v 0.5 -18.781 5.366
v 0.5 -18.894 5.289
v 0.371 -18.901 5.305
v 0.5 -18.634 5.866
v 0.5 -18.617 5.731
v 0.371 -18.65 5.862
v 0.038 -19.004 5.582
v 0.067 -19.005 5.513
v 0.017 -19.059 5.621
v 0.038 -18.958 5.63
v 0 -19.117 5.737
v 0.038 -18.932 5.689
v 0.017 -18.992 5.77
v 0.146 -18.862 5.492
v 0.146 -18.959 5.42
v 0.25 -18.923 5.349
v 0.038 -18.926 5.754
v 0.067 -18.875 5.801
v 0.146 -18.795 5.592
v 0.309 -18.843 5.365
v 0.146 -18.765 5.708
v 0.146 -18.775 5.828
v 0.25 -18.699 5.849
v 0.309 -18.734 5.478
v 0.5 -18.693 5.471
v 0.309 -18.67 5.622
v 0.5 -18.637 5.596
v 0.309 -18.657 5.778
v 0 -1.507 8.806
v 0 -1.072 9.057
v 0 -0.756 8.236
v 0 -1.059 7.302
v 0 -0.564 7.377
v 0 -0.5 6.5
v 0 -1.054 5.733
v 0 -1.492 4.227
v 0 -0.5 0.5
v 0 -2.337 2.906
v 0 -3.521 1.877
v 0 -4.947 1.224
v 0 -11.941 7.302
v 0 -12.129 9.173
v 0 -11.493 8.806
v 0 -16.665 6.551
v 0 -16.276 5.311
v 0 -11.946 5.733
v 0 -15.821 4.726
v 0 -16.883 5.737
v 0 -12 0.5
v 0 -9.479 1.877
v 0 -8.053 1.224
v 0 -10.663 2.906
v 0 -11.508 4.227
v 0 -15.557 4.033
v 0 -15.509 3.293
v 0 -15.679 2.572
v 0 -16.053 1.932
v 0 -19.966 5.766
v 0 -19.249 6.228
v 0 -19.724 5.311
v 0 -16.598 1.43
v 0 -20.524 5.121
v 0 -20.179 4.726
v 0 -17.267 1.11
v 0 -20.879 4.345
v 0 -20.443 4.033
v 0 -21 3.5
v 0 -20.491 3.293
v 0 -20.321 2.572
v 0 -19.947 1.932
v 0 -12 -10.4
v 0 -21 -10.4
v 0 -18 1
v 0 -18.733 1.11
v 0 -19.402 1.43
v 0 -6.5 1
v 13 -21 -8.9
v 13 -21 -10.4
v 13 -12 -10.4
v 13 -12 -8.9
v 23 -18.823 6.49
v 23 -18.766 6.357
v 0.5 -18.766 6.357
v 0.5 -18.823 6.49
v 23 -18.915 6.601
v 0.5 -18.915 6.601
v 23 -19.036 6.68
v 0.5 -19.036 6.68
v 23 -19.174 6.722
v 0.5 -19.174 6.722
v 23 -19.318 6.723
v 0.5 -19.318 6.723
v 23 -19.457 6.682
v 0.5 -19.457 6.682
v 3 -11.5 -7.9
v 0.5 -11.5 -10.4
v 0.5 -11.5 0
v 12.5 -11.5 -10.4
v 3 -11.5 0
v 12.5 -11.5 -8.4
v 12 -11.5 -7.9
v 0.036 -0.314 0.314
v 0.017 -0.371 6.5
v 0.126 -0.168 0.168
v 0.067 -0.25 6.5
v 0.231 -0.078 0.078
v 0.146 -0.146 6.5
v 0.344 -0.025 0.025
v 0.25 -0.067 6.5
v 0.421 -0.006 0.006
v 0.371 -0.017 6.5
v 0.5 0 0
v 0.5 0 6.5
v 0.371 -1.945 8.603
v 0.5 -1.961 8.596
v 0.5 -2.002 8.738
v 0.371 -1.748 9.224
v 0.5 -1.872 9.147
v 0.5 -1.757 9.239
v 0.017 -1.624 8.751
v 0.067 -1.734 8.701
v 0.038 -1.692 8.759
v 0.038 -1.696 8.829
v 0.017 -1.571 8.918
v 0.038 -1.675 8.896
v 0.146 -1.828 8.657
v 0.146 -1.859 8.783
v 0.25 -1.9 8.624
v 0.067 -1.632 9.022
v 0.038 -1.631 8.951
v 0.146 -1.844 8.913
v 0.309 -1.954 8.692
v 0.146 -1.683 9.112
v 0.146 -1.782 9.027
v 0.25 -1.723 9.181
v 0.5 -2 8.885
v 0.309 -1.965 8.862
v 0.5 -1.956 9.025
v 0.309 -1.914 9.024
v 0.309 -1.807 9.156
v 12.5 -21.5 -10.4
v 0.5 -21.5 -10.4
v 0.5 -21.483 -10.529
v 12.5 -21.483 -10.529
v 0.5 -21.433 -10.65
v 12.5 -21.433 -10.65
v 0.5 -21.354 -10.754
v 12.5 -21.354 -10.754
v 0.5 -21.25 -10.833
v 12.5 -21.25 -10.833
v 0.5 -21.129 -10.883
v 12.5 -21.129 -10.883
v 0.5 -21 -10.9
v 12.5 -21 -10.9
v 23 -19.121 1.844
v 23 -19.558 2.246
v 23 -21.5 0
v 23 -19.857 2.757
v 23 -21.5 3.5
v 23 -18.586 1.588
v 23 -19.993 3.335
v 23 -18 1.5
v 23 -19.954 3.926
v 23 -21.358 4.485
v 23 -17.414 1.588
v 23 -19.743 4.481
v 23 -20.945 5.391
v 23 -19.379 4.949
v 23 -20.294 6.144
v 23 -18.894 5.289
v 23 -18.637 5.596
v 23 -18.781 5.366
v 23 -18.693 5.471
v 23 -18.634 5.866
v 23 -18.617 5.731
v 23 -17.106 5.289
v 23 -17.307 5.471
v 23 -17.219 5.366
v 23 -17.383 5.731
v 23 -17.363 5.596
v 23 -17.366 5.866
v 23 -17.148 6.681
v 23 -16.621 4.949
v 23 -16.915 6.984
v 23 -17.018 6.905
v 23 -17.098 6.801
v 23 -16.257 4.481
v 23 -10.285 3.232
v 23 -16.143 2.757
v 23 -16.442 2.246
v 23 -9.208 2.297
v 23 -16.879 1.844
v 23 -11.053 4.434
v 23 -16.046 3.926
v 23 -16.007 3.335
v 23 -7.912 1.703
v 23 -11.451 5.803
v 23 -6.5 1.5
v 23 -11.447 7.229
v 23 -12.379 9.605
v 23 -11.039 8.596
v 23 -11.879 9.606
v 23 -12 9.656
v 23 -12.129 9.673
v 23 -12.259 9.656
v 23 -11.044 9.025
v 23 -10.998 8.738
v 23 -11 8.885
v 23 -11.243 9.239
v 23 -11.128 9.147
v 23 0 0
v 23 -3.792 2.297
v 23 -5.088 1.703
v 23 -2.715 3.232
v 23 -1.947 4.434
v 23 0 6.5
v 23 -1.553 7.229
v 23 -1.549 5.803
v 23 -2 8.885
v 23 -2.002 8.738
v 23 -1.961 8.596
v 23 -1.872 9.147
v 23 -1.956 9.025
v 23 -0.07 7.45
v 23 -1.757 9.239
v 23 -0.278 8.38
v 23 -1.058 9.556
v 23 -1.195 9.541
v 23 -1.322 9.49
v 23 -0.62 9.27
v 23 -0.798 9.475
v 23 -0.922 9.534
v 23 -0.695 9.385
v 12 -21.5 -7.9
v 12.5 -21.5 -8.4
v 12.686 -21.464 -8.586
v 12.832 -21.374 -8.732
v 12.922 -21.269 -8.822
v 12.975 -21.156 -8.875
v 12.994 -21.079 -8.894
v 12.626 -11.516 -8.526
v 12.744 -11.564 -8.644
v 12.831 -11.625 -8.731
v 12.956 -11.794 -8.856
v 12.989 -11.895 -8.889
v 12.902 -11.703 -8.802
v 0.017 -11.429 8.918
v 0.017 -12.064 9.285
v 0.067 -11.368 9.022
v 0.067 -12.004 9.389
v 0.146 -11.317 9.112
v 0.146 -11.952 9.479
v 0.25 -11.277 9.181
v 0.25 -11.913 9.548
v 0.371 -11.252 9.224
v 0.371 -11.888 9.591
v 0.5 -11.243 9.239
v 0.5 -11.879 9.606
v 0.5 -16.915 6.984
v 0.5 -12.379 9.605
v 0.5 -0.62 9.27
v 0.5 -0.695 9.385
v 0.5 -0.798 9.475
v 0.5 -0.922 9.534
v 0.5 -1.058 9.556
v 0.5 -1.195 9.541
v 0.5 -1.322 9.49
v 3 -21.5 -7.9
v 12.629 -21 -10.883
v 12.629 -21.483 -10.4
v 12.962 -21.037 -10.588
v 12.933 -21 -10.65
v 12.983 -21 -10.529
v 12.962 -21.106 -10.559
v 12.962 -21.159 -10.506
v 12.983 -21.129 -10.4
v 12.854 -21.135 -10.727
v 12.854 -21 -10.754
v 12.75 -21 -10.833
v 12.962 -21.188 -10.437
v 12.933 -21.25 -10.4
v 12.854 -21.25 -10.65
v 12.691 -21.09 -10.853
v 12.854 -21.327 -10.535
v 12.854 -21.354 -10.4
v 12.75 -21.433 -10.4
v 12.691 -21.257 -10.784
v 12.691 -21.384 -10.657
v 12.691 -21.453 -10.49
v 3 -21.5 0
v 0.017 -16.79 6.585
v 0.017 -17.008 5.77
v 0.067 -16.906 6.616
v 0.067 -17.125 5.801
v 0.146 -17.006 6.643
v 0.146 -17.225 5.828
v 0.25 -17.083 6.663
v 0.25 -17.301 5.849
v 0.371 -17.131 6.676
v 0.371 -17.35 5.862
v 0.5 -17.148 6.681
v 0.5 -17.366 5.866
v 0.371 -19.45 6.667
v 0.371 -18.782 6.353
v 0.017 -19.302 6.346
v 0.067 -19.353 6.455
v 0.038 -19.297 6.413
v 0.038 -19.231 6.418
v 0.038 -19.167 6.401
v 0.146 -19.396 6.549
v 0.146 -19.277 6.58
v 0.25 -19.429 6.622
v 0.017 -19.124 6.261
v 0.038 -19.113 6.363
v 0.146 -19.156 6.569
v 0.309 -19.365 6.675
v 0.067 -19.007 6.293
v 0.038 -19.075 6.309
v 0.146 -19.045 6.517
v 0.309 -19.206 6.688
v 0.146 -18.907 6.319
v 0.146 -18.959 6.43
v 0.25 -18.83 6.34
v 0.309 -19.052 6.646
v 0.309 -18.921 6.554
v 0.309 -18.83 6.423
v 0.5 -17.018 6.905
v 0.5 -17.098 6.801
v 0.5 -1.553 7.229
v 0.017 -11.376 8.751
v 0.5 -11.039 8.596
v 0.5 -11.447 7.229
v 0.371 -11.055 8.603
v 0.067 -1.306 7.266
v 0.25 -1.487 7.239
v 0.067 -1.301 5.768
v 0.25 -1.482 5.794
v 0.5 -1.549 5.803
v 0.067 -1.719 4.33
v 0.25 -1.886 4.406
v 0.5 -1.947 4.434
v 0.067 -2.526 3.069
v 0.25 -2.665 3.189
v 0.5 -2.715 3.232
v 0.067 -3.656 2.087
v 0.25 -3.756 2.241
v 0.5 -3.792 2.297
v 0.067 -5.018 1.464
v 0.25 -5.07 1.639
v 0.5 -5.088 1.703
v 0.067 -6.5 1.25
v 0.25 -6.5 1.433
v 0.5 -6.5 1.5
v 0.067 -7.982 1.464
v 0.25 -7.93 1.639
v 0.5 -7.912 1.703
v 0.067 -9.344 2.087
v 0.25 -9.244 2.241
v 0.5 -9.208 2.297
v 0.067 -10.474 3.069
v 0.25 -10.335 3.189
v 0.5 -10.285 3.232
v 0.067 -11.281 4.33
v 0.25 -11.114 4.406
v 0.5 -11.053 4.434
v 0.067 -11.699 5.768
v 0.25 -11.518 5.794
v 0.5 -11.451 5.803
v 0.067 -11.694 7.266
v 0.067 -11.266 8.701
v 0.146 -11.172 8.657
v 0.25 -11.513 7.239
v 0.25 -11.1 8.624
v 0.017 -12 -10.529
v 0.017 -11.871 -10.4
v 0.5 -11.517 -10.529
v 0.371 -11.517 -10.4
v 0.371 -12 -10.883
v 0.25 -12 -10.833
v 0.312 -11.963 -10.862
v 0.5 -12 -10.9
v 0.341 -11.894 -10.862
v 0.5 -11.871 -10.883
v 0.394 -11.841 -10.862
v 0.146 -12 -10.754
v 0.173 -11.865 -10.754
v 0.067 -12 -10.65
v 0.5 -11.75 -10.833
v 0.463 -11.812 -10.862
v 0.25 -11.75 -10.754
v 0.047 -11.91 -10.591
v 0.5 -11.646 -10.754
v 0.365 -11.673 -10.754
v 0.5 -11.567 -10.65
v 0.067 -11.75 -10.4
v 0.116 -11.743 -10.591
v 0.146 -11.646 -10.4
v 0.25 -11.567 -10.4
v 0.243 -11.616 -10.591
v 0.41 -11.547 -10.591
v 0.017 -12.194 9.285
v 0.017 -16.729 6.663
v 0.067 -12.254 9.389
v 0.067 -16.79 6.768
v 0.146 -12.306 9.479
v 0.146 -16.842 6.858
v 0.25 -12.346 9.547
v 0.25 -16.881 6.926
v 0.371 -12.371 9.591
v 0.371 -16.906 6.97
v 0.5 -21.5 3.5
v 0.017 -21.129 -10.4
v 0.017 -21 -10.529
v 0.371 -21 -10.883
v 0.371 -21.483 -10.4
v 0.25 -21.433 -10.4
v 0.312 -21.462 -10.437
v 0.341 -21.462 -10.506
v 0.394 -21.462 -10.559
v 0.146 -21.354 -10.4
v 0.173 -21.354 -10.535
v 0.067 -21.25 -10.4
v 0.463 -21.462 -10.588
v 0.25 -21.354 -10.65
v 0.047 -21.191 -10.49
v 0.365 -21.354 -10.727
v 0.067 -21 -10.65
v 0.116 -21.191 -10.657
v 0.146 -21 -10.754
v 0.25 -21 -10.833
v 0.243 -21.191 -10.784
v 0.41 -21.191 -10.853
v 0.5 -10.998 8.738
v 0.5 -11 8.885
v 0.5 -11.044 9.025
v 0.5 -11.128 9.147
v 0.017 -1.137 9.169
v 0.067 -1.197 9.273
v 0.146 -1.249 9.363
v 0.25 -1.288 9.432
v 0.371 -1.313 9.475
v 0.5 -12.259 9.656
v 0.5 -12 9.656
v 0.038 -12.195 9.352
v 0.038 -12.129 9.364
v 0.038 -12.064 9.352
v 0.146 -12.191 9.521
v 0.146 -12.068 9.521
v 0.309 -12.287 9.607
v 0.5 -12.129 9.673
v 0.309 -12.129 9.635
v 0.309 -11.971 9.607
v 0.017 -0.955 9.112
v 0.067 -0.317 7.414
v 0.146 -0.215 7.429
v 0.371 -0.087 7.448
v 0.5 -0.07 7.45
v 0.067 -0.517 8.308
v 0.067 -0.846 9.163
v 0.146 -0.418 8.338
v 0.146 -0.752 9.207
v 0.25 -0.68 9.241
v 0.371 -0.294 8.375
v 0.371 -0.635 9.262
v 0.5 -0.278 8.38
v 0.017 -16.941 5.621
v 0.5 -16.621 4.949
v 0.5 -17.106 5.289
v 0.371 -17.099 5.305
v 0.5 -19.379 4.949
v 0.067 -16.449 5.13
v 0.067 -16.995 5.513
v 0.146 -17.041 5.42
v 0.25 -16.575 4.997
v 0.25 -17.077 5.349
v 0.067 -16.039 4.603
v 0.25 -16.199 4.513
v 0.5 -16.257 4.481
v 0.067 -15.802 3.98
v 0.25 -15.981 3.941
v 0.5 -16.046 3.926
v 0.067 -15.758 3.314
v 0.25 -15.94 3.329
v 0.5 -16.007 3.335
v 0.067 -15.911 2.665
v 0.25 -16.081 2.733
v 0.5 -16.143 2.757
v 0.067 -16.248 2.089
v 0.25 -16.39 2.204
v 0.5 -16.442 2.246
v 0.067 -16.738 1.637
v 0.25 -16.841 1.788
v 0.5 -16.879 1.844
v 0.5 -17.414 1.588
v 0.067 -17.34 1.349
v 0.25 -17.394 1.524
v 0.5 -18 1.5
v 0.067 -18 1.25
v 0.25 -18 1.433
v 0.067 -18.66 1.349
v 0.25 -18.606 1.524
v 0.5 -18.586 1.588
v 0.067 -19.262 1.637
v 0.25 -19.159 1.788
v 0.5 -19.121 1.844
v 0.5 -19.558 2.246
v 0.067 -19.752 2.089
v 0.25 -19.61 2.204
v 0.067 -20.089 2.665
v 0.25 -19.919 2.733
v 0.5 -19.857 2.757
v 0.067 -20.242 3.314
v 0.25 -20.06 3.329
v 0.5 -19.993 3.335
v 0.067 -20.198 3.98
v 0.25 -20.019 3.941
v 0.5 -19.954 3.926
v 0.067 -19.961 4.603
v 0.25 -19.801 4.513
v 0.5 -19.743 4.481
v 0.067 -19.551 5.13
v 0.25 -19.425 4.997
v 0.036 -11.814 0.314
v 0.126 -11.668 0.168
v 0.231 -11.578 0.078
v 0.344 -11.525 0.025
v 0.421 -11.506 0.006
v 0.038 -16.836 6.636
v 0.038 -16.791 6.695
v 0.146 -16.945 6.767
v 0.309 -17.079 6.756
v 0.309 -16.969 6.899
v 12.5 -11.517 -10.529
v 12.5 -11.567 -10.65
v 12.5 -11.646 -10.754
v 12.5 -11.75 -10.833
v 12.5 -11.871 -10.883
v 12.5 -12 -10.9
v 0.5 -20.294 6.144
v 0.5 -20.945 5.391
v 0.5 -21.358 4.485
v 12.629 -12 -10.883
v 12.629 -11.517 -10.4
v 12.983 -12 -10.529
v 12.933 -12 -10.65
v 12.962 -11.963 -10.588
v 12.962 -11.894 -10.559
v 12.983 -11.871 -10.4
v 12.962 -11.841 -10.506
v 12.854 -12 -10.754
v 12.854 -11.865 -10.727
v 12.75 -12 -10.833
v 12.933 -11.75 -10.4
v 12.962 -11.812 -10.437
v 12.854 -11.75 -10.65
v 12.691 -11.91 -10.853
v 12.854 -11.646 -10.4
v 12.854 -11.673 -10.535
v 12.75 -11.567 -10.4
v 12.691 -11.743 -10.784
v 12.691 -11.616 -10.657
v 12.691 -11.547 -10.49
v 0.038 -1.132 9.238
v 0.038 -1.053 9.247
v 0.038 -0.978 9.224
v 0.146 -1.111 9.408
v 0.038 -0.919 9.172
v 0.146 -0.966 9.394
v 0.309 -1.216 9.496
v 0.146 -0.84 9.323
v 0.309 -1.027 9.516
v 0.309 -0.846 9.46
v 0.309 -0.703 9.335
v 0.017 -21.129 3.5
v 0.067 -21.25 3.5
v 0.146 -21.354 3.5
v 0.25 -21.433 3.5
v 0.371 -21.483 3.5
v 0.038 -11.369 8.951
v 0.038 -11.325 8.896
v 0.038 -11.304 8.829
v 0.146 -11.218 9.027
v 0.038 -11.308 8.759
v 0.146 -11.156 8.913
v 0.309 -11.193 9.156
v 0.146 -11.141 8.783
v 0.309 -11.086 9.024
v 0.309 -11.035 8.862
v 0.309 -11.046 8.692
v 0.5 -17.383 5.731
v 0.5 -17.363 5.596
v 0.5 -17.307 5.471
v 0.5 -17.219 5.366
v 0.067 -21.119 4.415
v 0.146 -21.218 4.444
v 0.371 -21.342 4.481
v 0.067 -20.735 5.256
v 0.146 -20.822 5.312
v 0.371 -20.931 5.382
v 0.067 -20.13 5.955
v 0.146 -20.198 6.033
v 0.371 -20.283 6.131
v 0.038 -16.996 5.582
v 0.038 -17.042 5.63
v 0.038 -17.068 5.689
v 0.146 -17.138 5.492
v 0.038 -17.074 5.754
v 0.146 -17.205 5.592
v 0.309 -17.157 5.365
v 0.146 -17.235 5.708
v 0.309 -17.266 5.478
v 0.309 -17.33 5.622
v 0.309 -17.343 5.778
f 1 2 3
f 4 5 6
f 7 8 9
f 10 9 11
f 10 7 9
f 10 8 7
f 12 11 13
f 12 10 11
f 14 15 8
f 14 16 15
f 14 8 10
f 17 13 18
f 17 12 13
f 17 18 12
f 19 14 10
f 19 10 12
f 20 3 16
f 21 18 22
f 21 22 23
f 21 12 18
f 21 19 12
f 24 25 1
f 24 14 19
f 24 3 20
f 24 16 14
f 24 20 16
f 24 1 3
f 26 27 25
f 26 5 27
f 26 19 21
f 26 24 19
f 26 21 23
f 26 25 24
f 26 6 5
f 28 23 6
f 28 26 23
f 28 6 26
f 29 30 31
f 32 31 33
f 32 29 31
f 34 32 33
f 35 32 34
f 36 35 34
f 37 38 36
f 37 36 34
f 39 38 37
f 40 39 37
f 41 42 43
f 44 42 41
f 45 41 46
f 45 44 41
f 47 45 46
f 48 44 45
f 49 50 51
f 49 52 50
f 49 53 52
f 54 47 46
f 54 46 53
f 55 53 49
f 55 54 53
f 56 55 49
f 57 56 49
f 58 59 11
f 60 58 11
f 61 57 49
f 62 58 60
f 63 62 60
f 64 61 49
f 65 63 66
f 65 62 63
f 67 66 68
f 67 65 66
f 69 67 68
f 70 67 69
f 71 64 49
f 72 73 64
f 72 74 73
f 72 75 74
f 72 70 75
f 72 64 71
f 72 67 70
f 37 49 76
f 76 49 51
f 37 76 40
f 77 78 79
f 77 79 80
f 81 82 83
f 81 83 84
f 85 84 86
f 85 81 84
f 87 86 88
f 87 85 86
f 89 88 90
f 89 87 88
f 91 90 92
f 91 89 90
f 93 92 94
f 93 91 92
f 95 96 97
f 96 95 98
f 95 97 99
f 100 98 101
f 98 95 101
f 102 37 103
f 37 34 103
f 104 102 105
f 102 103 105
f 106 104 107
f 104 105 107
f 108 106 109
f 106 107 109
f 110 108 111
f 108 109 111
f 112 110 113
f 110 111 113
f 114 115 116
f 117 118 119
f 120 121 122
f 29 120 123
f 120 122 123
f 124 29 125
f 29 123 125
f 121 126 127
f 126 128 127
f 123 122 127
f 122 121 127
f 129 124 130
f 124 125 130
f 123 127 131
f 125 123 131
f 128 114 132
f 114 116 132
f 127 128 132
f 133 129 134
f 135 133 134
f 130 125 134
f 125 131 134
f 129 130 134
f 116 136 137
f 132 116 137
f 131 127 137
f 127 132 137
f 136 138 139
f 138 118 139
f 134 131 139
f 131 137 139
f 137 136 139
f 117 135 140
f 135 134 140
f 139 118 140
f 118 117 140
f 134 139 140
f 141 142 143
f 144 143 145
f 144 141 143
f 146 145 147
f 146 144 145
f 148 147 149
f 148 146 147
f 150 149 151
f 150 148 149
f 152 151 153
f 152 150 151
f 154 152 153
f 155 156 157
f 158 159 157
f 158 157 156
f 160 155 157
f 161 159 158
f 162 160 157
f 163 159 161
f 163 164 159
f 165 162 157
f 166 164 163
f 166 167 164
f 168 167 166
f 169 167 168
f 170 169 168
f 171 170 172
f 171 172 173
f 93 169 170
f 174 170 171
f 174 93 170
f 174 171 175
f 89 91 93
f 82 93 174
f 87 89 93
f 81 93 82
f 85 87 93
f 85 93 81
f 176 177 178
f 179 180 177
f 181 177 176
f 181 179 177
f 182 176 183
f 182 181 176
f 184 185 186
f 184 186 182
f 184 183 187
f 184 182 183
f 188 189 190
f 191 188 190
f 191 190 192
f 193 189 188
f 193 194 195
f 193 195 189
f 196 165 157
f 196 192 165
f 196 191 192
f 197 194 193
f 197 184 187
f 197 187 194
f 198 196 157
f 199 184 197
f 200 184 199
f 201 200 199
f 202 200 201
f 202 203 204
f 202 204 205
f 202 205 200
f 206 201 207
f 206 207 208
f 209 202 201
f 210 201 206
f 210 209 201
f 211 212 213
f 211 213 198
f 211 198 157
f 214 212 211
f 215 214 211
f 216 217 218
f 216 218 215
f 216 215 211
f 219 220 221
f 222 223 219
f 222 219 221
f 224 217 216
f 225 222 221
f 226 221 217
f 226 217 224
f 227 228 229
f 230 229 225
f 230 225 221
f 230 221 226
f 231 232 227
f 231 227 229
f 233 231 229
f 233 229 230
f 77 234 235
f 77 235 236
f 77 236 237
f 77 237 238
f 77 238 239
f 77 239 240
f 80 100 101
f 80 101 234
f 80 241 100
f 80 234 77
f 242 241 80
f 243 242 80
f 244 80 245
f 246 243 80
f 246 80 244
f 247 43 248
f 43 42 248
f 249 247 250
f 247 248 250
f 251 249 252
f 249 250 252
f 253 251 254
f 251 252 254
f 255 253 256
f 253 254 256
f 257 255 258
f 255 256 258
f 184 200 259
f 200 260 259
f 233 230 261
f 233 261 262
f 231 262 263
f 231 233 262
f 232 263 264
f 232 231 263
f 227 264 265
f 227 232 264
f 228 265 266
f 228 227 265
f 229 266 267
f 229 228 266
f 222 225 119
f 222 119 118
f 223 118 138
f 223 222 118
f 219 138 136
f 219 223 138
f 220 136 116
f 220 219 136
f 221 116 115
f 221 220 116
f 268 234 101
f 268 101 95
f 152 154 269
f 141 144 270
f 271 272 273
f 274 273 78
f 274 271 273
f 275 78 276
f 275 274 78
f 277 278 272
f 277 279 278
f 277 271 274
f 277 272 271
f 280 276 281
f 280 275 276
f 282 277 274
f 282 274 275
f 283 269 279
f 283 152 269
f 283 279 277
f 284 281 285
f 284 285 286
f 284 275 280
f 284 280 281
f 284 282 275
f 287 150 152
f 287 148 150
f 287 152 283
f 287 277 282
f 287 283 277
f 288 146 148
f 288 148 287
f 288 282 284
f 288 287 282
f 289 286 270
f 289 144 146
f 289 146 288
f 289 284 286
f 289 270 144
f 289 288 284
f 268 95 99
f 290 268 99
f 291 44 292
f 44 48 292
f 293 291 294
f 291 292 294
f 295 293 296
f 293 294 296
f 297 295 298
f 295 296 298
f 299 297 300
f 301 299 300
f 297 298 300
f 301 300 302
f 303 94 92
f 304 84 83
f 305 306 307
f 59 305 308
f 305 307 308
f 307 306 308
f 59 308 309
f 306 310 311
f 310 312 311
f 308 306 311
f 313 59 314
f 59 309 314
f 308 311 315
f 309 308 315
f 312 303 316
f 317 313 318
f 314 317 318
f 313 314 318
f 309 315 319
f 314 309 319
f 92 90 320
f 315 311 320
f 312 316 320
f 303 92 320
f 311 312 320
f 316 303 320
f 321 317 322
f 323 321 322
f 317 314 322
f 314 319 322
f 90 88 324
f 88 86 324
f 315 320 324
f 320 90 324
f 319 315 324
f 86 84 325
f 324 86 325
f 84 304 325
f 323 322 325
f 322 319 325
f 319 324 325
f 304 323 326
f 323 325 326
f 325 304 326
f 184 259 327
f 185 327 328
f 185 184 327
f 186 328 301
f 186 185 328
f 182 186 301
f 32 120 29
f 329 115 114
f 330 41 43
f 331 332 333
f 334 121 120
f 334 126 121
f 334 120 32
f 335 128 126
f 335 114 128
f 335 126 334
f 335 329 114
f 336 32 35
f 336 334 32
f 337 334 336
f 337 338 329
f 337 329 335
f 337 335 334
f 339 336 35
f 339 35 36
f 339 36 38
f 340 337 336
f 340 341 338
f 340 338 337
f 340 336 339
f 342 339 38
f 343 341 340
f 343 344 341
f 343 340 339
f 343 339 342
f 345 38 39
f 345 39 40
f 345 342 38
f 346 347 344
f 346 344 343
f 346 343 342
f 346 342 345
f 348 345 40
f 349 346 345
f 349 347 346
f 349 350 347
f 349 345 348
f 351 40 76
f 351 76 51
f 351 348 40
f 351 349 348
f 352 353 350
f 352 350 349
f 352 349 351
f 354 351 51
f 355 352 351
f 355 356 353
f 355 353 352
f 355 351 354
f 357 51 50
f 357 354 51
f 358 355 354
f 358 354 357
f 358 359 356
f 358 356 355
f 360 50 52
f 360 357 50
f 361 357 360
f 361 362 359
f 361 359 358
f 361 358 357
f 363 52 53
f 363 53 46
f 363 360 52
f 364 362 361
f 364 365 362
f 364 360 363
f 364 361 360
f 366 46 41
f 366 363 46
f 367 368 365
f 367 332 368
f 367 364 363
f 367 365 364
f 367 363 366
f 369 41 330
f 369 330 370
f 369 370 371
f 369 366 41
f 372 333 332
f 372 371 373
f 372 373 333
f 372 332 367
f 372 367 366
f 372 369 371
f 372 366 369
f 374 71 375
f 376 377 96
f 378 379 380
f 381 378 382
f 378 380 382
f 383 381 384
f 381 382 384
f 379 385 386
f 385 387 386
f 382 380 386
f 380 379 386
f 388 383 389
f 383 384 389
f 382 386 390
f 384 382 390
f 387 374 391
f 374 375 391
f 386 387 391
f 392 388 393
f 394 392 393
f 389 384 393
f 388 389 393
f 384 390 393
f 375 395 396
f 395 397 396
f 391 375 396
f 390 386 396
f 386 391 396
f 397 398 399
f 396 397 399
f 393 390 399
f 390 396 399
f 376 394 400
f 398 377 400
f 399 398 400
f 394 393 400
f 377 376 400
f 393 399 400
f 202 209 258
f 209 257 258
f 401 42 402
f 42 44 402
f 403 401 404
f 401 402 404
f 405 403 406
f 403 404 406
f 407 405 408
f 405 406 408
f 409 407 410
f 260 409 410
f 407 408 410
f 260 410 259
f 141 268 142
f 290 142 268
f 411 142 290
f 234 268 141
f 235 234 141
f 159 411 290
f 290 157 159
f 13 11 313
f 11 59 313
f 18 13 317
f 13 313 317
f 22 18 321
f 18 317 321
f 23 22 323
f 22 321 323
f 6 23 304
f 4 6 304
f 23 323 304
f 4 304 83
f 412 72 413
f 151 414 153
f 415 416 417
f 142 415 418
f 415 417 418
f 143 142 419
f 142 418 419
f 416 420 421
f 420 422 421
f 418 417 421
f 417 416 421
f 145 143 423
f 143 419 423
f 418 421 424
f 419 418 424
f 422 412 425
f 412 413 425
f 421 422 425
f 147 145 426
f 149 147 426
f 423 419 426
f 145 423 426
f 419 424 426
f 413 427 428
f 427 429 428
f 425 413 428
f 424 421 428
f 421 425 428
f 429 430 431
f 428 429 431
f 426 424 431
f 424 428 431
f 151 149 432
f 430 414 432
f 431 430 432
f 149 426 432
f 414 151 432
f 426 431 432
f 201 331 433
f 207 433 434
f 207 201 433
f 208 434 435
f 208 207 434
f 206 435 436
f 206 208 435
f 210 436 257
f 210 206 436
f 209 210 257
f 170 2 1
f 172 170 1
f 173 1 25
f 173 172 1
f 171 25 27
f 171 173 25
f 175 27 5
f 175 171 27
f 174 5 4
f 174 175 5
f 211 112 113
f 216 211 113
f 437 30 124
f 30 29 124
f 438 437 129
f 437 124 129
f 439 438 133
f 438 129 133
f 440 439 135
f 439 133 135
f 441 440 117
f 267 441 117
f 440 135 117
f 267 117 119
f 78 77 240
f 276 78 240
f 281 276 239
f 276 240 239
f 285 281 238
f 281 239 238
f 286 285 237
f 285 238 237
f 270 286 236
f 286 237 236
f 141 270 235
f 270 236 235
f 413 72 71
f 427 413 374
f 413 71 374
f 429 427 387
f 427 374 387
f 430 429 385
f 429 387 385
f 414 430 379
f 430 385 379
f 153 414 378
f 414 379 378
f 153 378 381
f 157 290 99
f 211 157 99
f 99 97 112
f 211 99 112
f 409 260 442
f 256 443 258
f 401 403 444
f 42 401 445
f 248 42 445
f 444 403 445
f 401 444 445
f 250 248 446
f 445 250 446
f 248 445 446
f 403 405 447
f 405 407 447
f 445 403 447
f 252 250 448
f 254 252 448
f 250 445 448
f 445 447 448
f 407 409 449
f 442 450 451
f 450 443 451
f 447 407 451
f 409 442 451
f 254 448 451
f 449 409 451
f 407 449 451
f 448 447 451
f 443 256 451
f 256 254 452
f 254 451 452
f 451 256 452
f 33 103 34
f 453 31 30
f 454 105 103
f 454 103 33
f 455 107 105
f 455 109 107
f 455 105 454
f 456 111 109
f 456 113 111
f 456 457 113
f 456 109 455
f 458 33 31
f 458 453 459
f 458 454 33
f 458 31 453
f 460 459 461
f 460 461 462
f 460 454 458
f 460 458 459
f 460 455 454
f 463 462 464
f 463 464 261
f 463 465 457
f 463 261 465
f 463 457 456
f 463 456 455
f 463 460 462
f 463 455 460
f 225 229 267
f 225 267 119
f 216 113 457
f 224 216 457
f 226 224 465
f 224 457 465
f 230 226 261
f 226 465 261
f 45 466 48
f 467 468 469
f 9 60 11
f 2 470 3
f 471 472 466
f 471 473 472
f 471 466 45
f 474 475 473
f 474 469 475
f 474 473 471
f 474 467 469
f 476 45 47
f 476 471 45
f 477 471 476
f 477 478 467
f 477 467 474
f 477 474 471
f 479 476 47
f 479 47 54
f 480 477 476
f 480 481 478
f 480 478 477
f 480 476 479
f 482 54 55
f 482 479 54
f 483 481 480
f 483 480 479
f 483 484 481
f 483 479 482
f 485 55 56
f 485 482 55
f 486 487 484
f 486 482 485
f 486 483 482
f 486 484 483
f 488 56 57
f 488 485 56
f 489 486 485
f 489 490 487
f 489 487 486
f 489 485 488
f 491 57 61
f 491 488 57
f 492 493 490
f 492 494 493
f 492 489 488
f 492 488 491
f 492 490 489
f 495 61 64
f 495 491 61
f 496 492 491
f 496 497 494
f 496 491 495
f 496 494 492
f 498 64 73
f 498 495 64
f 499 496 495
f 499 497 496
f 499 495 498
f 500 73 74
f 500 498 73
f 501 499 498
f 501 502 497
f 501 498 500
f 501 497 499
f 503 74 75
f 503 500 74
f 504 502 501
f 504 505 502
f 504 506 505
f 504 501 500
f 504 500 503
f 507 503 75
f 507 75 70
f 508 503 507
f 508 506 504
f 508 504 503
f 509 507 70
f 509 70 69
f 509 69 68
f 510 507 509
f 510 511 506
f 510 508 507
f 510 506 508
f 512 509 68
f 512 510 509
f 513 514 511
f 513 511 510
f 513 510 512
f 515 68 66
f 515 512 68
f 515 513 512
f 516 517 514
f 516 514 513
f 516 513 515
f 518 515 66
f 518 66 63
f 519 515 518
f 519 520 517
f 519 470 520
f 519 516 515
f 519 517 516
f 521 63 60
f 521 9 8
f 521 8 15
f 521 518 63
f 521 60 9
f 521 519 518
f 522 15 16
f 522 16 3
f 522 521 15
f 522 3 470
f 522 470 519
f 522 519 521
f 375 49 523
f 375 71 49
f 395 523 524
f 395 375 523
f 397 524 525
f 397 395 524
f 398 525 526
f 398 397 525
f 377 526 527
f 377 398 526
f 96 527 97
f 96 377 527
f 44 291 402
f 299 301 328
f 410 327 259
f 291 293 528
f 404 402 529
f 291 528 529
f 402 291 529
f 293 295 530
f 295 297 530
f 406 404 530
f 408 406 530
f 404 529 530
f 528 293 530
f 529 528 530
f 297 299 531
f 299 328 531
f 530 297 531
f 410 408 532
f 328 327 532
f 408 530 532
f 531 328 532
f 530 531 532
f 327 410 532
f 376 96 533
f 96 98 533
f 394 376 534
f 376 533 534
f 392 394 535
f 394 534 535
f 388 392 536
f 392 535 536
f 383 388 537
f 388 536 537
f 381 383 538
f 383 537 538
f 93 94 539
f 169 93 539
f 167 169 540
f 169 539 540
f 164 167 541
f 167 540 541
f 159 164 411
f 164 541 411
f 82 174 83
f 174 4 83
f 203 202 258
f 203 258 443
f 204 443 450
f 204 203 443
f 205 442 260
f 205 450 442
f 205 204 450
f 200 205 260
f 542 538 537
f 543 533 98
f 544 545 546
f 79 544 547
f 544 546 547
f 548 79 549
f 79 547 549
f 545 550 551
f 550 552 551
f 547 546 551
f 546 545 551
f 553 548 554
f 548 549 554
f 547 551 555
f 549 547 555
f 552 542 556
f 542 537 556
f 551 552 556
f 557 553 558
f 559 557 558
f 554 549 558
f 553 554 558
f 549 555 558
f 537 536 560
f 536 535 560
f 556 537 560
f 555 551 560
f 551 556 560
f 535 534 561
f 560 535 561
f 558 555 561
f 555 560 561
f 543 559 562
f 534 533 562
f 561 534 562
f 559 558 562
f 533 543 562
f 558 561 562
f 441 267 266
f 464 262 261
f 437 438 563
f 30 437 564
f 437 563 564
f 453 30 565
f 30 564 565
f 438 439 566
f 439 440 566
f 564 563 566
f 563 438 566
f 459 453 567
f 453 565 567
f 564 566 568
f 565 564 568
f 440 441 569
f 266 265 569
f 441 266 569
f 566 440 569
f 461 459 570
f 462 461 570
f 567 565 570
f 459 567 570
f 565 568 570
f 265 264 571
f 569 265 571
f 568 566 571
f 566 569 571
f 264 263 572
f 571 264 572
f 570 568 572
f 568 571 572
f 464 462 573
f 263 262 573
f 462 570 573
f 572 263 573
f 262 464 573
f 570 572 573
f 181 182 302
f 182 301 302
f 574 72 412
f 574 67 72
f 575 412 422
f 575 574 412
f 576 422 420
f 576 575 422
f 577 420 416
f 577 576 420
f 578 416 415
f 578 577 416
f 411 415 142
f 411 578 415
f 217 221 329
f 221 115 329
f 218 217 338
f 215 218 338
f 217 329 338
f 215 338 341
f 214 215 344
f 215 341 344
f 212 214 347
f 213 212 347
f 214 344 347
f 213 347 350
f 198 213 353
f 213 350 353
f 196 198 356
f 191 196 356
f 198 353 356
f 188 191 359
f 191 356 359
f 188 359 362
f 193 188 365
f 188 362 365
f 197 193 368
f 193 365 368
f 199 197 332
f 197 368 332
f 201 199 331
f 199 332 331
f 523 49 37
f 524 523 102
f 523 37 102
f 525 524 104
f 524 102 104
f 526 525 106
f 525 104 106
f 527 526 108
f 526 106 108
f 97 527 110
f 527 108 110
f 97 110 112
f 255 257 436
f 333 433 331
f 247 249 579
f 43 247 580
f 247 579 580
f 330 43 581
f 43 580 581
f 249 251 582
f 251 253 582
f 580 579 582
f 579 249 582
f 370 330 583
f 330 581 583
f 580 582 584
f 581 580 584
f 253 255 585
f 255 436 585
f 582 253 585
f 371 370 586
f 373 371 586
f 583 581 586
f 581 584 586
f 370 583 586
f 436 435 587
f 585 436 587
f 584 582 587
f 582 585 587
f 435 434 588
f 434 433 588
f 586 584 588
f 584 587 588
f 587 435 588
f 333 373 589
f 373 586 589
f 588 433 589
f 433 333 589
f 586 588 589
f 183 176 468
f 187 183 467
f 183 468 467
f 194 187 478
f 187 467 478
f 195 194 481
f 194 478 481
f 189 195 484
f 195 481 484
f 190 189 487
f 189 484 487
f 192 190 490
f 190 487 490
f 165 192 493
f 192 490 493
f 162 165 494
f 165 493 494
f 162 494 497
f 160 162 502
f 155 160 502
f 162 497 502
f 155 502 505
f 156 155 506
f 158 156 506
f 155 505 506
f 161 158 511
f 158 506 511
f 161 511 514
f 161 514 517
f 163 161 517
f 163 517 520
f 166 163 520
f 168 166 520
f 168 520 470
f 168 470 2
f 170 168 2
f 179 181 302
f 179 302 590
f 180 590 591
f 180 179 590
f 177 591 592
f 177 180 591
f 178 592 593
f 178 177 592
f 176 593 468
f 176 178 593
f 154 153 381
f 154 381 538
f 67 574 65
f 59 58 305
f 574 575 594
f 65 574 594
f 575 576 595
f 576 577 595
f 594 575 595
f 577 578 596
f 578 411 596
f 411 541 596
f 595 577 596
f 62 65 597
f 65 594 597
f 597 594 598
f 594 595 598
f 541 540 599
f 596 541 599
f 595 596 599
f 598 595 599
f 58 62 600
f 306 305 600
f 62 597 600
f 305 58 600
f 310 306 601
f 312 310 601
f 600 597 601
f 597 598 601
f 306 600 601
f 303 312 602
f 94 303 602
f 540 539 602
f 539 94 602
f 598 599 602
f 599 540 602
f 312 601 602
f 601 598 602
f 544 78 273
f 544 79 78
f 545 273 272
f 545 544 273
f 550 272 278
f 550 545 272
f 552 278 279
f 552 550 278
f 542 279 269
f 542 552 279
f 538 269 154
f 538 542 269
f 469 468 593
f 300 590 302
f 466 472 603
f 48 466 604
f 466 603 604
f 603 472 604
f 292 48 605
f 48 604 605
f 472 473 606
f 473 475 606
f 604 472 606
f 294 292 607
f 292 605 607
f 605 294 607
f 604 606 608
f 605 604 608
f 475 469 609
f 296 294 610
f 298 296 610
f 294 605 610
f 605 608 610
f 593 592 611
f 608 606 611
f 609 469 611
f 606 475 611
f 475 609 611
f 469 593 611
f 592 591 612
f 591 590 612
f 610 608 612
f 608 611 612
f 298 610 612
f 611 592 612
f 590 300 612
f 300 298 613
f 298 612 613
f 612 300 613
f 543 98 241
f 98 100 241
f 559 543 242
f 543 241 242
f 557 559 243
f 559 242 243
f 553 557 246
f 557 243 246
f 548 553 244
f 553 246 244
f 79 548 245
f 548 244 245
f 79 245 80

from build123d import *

# Parameters (mm, degrees)
F1_DEPTH    = 23
F3_DEPTH    = 10
F4_R        = 0.5
F5_T1_DEPTH = 14.1433659759


# Not quite as in the source:
# - a fillet or chamfer that OpenCascade refuses, or shapes differently, is made with other operations: its cross-section is extruded or revolved along the edge and cut away or added


with BuildPart() as f1:
    # F0 (on Right) → F1 (new body)
    with BuildSketch(Plane.YZ):
        with BuildLine():
            Line((-21.5, 0), (0, 0))
            Line((0, 0), (0, 6.5))
            ThreePointArc((0, 6.5), (-0.2214821291, 8.1823237932), (-0.8708348754, 9.75))
            Line((-0.8708348754, 9.75), (-2.1698729811, 9))
            ThreePointArc((-2.1698729811, 9), (-6.5, 1.5), (-10.8301270189, 9))
            Line((-10.8301270189, 9), (-12.1291651246, 9.75))
            Line((-12.1291651246, 9.75), (-17.0941333421, 6.880740392))
            Line((-17.0941333421, 6.880740392), (-17.4823619098, 5.4318516526))
            ThreePointArc((-17.4823619098, 5.4318516526), (-18, 1.5), (-18.5176380902, 5.4318516526))
            Line((-18.5176380902, 5.4318516526), (-18.9058666579, 6.880740392))
            ThreePointArc((-18.9058666579, 6.880740392), (-20.776736691, 5.6306650015), (-21.5, 3.5))
            Line((-21.5, 3.5), (-21.5, 0))
        make_face()
    extrude(amount=F1_DEPTH)

    # F2 (on face) → F3 (join)
    with BuildSketch(Plane.XZ.offset(21.5)):
        Polygon((3, 0), (0, 0), (0, -10.9), (13, -10.9), (13, -7.9), (3, -7.9), align=None)
    extrude(amount=-F3_DEPTH)

    # F4
    f4_edges = [f1.edges().sort_by_distance(p)[0] for p in [
        (0, -18, 1.5),
        (0, -17.288248, 6.156296),
        (0, -14.611649, 8.31537),
        (0, -11.479646, 9.375),
        (0, -6.5, 1.5),
        (0, -1.520354, 9.375),
        (0, 0, 3.25),
        (0, -5.75, 0),
        (0, -11.5, -5.45),
        (0, -16.5, -10.9),
        (0, -21.5, -3.7),
        (0, -18.711752, 6.156296),
        (6.5, -21.5, -10.9),
        (6.5, -11.5, -10.9),
        (13, -16.5, -10.9),
        (13, -11.5, -9.4),
        (13, -21.5, -9.4),
        (11.5, -17.482362, 5.431852),
        (11.5, -17.094133, 6.88074),
        (11.5, -18.517638, 5.431852),
        (11.5, -18.905867, 6.88074),
        (11.5, -12.129165, 9.75),
        (11.5, -10.830127, 9),
        (11.5, -2.169873, 9),
        (11.5, -0.870835, 9.75),
        (0, -20.776737, 5.630665),
        (0, -0.221482, 8.182324),
    ]]
    fillet(f4_edges, radius=F4_R)

    # F5: chamfer of 1 on 1 edges, made by hand

    # F5_s2 → F5_t1 (cut)
    with BuildSketch(Plane.XZ.offset(9.428317012)):
        Polygon((12, -7.9), (13, -8.9), (13, -7.9), align=None)
    extrude(amount=F5_T1_DEPTH, mode=Mode.SUBTRACT)


solid = f1.part
